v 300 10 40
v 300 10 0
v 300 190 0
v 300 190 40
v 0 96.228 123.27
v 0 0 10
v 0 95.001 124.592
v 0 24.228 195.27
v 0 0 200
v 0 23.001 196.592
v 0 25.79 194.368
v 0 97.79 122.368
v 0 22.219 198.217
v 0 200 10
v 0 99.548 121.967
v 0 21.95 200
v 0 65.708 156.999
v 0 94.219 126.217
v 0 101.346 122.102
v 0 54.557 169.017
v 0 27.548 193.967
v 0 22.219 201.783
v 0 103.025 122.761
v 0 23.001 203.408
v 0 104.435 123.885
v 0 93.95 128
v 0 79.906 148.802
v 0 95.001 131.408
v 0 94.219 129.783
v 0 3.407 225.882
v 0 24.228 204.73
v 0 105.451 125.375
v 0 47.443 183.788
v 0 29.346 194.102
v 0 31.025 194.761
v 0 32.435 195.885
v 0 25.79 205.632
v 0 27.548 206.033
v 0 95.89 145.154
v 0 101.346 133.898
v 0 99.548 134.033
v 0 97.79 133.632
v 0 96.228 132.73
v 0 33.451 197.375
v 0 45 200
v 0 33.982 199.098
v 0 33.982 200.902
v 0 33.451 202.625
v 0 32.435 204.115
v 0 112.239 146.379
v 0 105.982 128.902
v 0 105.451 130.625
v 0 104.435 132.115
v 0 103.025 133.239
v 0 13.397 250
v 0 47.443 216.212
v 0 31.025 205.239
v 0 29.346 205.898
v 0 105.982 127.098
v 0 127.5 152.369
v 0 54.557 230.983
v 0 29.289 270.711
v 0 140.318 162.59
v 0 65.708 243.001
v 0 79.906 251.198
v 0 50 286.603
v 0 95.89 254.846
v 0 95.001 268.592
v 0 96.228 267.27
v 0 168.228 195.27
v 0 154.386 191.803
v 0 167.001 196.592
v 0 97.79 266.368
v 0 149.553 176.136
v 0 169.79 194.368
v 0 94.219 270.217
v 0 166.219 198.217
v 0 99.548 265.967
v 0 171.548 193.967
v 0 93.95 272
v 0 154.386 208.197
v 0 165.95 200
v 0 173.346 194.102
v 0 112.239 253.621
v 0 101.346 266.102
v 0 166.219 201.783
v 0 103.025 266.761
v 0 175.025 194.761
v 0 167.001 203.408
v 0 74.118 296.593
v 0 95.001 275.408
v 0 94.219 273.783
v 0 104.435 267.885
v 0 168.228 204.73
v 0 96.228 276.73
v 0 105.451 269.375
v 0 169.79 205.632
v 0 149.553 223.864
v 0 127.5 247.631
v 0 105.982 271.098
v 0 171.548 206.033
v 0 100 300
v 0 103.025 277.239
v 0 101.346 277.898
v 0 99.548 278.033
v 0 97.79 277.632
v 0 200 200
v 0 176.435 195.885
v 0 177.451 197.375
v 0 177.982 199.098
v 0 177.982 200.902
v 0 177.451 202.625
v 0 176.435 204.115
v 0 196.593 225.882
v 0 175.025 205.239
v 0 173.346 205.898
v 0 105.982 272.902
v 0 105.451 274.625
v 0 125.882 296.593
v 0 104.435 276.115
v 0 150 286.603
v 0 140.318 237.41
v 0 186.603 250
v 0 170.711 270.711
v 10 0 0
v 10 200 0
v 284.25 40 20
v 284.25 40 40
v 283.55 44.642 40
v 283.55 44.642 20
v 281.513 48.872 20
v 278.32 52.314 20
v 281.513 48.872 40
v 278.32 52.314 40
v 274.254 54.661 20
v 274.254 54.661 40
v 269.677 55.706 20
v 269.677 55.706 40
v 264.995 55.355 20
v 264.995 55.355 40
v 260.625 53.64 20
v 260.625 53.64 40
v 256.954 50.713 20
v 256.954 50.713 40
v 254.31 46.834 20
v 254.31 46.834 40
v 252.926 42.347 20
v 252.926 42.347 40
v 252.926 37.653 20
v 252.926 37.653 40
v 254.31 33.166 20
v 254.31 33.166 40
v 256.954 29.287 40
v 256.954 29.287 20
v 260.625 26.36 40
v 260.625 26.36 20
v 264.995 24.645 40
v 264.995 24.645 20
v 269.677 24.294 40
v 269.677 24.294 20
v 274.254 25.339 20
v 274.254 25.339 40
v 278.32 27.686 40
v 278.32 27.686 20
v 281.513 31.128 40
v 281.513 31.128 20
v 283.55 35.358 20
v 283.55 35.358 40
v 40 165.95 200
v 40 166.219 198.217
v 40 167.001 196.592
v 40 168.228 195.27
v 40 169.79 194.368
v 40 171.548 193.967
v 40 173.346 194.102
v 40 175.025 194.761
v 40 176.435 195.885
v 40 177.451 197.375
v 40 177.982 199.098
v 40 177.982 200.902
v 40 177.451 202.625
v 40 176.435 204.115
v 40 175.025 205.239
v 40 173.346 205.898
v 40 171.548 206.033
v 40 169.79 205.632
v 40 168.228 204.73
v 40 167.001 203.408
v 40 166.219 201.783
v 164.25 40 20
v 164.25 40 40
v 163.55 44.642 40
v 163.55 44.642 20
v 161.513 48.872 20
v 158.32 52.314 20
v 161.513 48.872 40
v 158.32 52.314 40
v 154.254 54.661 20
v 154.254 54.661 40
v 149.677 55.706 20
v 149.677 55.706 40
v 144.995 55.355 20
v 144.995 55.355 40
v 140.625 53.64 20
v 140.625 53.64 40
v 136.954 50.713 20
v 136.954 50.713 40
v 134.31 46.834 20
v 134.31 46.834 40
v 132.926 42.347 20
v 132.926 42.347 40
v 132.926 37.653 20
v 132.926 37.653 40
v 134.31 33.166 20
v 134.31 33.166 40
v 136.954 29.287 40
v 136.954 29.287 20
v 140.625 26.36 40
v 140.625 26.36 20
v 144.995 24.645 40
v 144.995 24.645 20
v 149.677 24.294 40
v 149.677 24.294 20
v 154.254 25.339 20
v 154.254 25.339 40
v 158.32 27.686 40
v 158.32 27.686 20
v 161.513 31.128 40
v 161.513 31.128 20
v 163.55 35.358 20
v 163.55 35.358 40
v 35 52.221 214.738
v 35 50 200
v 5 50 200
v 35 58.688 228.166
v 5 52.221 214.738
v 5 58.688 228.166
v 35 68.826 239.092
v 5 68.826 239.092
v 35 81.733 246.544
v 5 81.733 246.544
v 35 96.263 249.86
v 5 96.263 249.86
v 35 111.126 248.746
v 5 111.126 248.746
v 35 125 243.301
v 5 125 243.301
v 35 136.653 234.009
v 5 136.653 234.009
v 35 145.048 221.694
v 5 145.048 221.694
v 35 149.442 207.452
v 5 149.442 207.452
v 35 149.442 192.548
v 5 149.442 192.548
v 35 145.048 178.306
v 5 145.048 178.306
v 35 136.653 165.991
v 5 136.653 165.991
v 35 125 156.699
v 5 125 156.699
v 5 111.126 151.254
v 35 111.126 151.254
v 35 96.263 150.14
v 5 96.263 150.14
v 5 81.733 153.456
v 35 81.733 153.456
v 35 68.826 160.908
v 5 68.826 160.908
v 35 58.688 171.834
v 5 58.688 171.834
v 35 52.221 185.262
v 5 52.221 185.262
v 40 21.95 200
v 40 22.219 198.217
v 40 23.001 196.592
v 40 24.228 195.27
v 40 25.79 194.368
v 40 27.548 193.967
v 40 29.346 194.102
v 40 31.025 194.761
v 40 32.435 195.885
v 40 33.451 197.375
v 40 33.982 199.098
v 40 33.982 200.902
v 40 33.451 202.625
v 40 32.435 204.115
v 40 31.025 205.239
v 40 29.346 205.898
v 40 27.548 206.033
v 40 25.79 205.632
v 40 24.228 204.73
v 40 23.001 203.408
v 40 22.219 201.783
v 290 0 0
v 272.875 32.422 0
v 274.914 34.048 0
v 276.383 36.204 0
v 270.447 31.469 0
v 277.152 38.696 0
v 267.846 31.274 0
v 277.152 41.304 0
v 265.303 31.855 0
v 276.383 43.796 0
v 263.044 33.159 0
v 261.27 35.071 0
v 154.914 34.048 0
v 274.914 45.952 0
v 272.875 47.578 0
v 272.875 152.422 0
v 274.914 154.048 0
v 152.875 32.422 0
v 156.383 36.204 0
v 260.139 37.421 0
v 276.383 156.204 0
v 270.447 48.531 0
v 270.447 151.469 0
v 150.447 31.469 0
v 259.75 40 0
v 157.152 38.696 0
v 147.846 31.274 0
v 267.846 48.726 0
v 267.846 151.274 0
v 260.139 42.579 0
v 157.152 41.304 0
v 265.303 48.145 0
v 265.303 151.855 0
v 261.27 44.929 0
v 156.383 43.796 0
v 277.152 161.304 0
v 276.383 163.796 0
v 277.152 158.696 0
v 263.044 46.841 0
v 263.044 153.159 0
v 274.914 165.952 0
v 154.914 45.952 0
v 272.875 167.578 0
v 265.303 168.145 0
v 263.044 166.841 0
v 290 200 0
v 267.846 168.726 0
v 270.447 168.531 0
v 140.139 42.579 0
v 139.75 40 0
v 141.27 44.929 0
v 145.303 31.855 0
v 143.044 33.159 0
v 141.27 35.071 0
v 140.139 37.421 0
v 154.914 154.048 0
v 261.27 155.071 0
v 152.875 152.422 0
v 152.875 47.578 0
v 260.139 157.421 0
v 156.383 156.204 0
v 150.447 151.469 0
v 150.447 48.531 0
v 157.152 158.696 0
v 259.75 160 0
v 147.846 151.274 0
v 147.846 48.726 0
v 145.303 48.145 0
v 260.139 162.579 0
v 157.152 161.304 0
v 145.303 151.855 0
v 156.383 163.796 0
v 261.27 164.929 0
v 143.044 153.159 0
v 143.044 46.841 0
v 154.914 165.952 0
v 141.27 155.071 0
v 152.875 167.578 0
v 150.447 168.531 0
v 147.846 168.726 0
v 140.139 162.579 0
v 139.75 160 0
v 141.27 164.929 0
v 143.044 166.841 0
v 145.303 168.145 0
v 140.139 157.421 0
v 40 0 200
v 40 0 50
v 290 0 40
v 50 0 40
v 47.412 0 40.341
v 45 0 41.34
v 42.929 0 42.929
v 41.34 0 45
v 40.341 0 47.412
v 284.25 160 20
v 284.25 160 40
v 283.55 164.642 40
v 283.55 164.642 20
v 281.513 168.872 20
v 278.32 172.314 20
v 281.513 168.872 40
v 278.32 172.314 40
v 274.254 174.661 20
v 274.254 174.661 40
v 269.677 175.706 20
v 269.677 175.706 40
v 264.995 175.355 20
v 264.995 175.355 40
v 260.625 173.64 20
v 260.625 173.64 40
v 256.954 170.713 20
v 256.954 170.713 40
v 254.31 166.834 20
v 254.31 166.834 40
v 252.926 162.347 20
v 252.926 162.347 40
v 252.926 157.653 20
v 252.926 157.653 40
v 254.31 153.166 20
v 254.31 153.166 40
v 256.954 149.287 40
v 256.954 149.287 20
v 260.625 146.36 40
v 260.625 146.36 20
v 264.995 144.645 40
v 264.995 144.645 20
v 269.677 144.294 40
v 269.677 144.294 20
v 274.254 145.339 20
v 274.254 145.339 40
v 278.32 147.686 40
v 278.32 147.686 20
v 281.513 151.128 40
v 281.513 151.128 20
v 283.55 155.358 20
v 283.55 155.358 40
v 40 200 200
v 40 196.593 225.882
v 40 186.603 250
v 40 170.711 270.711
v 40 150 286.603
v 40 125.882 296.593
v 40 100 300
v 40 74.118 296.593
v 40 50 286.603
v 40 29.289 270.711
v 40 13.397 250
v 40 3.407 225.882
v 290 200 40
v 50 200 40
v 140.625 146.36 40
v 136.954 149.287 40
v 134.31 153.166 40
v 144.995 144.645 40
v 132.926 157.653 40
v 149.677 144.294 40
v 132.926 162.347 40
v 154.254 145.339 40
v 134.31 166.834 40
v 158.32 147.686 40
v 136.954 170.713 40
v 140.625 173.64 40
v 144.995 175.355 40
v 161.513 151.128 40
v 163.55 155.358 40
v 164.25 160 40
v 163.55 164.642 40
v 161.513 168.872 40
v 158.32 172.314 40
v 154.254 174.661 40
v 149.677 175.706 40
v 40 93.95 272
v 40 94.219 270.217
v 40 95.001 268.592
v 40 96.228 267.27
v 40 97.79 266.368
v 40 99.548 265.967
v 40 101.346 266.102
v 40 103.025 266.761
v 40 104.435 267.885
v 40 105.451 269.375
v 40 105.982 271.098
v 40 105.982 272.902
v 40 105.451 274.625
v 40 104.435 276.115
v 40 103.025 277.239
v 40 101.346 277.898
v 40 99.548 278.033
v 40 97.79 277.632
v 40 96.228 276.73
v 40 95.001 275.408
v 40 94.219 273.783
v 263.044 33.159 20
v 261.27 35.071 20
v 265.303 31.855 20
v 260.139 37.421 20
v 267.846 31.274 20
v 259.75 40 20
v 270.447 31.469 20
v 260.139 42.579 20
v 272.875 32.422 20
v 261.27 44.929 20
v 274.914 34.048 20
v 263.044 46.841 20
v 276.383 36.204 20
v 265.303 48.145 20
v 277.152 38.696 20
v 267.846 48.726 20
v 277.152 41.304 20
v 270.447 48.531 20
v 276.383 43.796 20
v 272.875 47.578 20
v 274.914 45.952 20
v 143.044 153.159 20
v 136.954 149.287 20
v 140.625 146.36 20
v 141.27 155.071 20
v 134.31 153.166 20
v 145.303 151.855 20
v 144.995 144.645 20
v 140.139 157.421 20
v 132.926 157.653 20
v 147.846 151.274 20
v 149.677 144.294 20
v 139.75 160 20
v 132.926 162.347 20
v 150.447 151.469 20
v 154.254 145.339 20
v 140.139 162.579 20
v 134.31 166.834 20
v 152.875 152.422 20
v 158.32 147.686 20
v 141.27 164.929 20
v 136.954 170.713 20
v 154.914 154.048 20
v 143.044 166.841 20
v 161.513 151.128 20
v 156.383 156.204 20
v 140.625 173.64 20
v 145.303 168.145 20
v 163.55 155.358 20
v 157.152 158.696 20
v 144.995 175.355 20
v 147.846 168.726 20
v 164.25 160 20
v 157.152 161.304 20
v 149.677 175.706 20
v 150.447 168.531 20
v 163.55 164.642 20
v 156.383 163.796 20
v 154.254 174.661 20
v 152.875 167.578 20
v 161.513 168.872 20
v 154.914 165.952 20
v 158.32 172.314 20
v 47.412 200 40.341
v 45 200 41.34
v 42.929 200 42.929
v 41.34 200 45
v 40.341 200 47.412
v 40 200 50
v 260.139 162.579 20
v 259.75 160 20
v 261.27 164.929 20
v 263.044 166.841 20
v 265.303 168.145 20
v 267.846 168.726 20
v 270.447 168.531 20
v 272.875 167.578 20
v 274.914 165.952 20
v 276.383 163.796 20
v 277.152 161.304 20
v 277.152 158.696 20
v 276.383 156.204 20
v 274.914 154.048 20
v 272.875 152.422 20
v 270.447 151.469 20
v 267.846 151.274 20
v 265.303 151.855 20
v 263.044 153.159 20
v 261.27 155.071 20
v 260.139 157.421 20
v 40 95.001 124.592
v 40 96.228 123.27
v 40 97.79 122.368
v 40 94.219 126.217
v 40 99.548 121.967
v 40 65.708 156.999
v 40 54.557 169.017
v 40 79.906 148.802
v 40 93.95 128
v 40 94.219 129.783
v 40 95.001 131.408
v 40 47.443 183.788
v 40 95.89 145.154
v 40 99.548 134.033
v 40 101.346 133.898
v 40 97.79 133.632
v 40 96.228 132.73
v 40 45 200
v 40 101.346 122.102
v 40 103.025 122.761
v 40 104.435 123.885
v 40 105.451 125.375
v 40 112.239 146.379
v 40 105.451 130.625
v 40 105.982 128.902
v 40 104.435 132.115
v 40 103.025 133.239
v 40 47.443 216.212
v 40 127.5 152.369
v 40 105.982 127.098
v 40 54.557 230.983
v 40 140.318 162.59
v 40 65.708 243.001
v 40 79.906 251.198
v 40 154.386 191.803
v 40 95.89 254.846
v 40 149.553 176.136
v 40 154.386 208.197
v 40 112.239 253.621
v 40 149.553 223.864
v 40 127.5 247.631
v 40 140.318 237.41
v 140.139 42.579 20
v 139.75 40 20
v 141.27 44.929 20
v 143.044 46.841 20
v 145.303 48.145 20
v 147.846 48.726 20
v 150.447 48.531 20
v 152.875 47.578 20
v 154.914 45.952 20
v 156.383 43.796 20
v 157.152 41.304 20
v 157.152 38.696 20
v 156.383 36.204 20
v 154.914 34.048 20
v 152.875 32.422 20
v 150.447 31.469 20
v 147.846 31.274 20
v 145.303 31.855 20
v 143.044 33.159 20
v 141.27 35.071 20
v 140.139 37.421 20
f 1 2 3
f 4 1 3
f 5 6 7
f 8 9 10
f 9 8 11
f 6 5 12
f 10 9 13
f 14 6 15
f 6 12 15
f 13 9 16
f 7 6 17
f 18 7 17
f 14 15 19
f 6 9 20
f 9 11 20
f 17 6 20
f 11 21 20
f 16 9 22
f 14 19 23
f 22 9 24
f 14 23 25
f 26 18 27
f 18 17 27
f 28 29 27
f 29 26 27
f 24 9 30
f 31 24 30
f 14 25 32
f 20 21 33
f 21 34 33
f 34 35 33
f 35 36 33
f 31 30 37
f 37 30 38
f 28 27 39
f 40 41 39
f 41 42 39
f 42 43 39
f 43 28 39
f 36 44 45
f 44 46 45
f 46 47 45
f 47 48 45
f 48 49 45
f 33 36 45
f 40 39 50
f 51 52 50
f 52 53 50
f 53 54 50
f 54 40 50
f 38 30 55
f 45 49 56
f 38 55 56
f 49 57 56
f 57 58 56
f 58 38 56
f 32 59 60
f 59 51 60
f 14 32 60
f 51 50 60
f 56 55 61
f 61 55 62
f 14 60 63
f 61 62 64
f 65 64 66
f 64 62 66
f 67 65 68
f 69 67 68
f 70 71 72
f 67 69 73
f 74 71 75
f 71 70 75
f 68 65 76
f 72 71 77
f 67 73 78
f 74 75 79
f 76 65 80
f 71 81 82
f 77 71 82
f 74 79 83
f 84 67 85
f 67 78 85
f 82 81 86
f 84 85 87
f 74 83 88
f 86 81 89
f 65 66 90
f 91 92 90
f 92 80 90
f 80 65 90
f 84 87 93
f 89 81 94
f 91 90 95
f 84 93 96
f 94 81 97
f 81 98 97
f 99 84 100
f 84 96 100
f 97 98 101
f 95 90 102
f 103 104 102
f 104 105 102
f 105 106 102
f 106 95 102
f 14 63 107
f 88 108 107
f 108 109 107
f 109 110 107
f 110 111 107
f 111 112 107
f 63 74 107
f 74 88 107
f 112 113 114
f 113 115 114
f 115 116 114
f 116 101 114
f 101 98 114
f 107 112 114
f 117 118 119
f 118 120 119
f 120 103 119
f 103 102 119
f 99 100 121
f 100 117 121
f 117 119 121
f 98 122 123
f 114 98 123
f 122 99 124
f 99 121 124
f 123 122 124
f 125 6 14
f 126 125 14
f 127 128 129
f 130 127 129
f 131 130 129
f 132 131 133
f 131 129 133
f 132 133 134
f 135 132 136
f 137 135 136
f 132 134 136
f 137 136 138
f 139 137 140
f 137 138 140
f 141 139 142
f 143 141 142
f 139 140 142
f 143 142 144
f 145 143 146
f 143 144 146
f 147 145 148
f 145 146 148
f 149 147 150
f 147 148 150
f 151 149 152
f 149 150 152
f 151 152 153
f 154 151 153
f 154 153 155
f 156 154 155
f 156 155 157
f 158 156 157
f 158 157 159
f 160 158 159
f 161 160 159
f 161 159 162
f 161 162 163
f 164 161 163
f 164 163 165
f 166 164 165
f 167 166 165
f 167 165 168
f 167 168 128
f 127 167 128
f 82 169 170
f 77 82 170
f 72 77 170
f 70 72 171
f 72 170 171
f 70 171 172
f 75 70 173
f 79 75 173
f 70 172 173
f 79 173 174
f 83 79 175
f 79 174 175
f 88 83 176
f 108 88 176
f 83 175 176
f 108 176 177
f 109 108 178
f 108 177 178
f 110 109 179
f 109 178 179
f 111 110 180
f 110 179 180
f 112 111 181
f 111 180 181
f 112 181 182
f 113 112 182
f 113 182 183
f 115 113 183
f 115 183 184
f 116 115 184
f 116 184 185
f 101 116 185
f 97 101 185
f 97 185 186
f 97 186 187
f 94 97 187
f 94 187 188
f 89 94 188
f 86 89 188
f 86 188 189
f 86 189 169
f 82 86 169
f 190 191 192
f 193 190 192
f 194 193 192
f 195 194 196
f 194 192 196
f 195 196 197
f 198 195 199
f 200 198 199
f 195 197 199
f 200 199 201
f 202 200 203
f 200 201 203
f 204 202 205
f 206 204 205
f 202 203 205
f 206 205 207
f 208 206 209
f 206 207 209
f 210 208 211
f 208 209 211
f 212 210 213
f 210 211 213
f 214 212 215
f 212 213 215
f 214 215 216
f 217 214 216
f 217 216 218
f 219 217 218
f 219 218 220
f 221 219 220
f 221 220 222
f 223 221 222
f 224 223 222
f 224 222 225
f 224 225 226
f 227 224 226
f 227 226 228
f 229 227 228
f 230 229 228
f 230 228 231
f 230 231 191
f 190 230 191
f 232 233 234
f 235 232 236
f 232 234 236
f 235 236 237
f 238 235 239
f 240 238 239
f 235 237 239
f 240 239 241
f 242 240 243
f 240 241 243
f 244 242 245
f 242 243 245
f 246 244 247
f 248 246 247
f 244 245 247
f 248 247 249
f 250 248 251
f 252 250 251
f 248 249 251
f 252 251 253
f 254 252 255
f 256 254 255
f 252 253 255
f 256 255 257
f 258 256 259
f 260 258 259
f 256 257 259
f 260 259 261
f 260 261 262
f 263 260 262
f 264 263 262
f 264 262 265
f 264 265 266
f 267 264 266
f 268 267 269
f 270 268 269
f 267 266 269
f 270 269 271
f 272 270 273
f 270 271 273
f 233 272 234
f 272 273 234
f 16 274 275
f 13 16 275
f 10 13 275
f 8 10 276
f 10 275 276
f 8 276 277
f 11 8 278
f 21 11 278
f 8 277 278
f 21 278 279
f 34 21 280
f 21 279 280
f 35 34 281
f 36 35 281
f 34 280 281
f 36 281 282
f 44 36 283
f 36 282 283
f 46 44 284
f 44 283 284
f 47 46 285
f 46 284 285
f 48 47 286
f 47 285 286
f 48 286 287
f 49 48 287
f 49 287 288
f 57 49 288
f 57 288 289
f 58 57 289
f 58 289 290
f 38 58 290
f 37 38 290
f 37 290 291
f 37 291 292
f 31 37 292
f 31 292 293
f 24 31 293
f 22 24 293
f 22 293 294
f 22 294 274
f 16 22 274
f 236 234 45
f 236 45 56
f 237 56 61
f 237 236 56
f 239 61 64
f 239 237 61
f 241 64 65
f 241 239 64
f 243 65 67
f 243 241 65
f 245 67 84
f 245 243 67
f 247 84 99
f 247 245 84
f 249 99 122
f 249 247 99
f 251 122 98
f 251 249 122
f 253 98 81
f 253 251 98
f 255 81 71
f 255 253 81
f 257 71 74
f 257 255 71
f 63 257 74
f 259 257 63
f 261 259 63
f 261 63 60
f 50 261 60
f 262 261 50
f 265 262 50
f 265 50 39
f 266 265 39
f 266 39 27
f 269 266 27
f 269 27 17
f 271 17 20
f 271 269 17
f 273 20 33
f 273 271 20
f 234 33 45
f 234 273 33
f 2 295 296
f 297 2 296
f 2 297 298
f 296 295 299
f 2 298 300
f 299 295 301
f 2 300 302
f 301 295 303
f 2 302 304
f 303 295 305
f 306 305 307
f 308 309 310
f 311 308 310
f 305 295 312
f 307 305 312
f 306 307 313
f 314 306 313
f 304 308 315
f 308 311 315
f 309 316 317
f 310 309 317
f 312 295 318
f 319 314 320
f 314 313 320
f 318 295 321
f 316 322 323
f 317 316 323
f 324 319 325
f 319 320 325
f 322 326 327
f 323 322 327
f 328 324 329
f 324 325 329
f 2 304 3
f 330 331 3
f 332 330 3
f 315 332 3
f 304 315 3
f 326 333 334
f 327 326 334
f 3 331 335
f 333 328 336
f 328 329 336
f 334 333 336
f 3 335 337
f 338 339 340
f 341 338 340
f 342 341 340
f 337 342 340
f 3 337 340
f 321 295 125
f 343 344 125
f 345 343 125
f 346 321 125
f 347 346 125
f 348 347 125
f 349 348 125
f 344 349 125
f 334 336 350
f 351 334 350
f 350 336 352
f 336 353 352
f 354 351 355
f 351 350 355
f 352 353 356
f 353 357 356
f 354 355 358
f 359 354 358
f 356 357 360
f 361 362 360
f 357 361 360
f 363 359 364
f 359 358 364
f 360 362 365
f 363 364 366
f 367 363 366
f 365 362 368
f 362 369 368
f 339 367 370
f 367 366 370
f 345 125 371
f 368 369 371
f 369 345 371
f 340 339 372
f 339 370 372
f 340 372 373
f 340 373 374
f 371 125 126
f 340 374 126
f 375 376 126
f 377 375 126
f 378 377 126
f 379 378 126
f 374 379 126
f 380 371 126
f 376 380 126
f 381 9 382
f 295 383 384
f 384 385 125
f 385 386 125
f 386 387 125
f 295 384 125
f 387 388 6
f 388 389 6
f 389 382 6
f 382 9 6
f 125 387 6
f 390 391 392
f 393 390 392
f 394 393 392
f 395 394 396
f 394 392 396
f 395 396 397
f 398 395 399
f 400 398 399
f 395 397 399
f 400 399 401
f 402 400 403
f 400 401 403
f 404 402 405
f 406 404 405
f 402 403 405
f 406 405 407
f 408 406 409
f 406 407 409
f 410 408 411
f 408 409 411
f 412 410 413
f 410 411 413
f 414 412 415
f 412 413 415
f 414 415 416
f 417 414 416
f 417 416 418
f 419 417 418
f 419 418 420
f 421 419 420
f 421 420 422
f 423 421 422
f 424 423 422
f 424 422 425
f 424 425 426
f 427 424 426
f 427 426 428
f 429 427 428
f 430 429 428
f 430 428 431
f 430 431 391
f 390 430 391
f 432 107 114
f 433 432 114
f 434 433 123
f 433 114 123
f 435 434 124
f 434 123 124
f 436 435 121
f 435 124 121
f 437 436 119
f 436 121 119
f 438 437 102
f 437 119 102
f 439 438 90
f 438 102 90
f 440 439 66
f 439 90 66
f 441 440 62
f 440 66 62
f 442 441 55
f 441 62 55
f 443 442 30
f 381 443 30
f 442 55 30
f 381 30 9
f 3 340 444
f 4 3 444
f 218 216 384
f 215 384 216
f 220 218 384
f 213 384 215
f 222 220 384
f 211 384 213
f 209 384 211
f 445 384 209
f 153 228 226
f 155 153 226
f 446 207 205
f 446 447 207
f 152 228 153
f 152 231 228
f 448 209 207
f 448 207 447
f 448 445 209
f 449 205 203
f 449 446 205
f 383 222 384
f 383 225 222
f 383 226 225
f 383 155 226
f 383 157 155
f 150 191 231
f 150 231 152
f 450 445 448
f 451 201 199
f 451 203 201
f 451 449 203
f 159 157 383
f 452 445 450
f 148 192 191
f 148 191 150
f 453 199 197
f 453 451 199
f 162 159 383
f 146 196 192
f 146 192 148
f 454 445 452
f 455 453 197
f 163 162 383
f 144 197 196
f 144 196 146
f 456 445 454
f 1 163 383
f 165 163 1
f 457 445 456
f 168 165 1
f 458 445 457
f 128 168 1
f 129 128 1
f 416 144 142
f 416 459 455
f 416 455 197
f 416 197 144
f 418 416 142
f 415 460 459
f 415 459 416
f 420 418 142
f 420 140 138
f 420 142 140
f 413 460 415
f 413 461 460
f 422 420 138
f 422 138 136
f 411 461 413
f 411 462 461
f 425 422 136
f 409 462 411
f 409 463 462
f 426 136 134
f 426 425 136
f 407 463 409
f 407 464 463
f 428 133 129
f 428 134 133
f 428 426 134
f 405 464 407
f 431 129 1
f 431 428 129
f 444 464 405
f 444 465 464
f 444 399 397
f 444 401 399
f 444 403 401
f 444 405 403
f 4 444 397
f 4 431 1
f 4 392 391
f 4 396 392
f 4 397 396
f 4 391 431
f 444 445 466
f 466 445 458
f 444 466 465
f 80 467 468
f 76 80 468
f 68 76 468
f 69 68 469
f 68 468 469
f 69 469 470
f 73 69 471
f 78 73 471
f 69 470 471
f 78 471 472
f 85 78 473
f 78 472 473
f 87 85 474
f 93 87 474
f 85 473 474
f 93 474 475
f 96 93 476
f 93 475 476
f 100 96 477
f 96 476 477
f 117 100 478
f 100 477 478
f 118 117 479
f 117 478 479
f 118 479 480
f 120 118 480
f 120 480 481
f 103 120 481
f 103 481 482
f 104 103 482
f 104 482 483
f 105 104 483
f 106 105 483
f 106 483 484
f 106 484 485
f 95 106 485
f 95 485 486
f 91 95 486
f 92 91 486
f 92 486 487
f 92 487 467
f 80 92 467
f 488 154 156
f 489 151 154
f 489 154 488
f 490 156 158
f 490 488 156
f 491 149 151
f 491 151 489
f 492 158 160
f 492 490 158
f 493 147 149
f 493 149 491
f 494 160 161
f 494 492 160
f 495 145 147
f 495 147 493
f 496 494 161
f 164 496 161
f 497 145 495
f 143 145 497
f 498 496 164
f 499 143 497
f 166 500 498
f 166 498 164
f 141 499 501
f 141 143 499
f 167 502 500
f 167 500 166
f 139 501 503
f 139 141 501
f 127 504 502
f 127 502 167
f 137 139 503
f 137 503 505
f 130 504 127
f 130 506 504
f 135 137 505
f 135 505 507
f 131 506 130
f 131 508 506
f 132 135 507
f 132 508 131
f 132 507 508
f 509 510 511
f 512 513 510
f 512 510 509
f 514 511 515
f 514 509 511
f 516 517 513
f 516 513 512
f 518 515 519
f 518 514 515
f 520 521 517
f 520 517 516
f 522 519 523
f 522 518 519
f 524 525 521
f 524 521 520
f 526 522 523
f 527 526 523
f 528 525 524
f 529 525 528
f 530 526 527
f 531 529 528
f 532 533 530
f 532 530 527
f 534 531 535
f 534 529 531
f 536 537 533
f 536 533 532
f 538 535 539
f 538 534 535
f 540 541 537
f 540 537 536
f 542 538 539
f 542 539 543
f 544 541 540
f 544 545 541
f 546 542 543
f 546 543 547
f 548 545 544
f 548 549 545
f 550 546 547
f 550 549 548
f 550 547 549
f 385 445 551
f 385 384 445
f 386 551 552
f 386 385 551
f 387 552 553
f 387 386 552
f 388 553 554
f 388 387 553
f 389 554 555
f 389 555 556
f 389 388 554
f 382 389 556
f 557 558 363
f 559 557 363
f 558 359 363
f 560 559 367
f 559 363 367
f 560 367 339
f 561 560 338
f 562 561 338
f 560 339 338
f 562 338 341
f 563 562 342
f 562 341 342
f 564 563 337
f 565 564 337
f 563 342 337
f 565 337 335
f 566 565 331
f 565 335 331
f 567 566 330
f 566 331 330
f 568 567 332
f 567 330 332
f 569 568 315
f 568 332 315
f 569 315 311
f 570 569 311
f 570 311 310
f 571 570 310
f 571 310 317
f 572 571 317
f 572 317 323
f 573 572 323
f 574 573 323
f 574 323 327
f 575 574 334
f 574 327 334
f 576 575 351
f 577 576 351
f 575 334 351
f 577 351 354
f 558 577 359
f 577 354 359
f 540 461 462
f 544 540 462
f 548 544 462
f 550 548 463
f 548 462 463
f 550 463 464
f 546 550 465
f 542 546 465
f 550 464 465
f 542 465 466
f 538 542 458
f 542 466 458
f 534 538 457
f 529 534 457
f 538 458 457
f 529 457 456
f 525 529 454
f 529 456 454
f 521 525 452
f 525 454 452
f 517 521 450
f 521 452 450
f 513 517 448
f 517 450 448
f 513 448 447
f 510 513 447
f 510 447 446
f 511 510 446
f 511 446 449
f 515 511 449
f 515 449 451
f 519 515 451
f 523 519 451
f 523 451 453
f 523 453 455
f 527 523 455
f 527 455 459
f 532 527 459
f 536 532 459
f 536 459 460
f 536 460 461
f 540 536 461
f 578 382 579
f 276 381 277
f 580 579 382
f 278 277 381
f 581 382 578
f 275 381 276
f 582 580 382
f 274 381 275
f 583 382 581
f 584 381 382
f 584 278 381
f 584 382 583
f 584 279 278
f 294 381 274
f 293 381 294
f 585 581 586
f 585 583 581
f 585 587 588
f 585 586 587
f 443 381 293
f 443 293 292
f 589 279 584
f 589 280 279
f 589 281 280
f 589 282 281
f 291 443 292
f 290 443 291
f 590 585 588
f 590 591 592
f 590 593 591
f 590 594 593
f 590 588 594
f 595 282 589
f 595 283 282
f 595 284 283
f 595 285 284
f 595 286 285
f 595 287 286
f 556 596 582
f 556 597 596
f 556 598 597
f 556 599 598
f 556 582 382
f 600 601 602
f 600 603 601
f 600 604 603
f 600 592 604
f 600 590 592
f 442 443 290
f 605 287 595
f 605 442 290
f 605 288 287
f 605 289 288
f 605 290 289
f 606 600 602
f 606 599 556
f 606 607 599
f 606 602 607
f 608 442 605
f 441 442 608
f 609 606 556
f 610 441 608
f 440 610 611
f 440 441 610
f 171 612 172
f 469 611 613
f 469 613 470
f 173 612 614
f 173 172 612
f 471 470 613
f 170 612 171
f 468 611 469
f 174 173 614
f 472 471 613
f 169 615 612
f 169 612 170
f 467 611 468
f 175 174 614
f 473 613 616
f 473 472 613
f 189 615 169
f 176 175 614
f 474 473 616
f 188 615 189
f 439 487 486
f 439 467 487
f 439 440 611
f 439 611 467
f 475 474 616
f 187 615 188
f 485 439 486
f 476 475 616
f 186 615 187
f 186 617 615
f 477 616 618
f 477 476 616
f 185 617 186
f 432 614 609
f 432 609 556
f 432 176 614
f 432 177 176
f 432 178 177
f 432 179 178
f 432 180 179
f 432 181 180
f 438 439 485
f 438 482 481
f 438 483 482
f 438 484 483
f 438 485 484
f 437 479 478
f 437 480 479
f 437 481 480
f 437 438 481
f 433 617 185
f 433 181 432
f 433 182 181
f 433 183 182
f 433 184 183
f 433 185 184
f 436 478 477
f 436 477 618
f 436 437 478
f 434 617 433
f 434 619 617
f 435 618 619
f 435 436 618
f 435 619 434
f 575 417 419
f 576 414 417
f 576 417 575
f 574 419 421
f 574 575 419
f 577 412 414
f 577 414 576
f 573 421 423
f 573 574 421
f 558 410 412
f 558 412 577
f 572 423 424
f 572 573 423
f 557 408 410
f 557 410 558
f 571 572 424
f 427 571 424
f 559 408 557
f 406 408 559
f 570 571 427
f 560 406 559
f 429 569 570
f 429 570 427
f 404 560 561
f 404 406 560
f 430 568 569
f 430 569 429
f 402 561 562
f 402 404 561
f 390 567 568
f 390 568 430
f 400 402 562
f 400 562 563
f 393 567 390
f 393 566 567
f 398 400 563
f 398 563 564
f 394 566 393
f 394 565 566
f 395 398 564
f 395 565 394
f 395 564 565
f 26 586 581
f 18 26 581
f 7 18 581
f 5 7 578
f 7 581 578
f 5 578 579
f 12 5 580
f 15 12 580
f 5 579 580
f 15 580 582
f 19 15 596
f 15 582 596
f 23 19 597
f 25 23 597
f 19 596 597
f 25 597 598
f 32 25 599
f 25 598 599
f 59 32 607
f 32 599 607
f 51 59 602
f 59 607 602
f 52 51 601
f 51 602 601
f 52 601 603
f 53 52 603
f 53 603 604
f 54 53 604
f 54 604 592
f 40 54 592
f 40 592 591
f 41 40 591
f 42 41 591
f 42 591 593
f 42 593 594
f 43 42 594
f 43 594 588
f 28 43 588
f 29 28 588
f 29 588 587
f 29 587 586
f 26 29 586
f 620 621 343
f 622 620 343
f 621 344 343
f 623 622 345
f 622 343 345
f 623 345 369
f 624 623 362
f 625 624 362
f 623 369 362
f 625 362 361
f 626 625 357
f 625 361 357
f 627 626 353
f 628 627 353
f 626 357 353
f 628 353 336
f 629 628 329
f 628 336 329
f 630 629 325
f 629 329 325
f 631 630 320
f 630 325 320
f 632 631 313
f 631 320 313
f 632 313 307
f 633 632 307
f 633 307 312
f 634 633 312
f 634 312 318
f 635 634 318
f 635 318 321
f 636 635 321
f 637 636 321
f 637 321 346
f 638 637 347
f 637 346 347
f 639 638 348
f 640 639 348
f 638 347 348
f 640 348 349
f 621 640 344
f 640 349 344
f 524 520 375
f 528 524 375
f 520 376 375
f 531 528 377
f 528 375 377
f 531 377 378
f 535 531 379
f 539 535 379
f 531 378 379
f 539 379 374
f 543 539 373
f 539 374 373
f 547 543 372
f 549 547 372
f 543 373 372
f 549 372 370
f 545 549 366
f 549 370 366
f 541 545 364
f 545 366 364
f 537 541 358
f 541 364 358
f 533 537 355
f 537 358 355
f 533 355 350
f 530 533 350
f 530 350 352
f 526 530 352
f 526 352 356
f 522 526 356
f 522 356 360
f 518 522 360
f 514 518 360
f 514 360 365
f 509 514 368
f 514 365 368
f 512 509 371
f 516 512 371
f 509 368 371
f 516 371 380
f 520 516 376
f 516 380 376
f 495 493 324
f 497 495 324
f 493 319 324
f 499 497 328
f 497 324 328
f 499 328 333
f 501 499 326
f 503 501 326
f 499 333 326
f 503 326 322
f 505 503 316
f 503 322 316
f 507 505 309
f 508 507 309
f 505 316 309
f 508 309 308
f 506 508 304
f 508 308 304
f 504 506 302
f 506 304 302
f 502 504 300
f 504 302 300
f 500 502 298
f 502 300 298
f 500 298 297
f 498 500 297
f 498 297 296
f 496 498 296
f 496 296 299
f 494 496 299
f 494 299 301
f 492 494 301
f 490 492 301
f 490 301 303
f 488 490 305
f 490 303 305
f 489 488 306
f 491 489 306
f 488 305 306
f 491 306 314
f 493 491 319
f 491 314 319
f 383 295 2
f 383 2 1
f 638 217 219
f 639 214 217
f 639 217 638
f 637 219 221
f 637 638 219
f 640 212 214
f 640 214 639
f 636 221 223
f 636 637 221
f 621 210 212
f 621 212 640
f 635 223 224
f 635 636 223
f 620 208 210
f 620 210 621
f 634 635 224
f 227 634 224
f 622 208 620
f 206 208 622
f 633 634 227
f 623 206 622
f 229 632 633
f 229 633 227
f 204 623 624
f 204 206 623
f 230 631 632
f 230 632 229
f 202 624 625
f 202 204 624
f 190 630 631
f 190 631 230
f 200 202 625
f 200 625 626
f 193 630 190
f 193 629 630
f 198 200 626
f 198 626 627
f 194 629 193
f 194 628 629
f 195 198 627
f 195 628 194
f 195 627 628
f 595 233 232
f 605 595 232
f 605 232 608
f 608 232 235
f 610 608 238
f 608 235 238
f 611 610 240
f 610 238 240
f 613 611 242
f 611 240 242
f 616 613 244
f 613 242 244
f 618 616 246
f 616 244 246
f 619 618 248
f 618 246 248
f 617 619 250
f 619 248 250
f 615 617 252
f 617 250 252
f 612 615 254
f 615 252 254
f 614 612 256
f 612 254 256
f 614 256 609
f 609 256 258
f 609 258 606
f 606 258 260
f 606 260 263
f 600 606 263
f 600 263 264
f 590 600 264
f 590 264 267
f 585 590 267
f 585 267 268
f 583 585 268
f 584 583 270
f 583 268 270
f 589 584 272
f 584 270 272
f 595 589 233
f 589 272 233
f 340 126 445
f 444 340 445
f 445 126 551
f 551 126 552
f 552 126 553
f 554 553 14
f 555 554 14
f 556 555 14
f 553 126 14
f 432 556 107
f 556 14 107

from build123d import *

# Parameters (mm, degrees)
F1_W            = 10
F1_H            = 40
F1_W_2          = 180
F2_DEPTH        = 40
F3_D            = 12.1
F4_W            = 300
F4_H            = 200
F5_DEPTH        = 40
F6_SIZE         = 10
F7_SIZE         = 10
F8_SIZE         = 10
F9_R            = 10
F10_SIZE        = 5
F12_D           = 17.5
F12_CBORE_D     = 31.5
F12_CBORE_DEPTH = 20


with BuildPart() as f2:
    # F1 (on Right) → F2 (new body)
    with BuildSketch(Plane.YZ):
        with Locations((5, 20)):
            Rectangle(F1_W, F1_H)
        with Locations((100, 20)):
            Rectangle(F1_W_2, F1_H)
        with BuildLine():
            Line((0, 200), (0, 40))
            Line((0, 40), (10, 40))
            Line((10, 40), (190, 40))
            Line((190, 40), (200, 40))
            Line((200, 40), (200, 200))
            ThreePointArc((200, 200), (100, 100), (0, 200))
        make_face()
        with Locations((195, 20)):
            Rectangle(F1_W, F1_H)
        with BuildLine():
            ThreePointArc((200, 200), (100, 300), (0, 200))
            Line((0, 200), (50, 200))
            ThreePointArc((50, 200), (100, 250), (150, 200))
            Line((150, 200), (200, 200))
        make_face()
        with BuildLine():
            Line((50, 200), (0, 200))
            ThreePointArc((0, 200), (100, 100), (200, 200))
            Line((200, 200), (150, 200))
            ThreePointArc((150, 200), (100, 150), (50, 200))
        make_face()
    extrude(amount=F2_DEPTH)

    # F3 (through all)
    with Locations(Plane(origin=(0, 0, 0), x_dir=(0, 1, 0), z_dir=(-1, 0, 0))):
        with Locations((100, -272), (100, -128), (172, -200), (28, -200)):
            Hole(F3_D / 2)

    # F4 (on Top) → F5 (join)
    with BuildSketch(Plane.XY):
        with Locations((150, 100)):
            Rectangle(F4_W, F4_H)
    extrude(amount=F5_DEPTH)

    # F6
    f6_edges = [f2.edges().sort_by_distance(p)[0] for p in [
        (300, 0, 20),
    ]]
    chamfer(f6_edges, length=F6_SIZE)

    # F7
    f7_edges = [f2.edges().sort_by_distance(p)[0] for p in [
        (300, 200, 20),
    ]]
    chamfer(f7_edges, length=F7_SIZE)

    # F8
    f8_edges = [f2.edges().sort_by_distance(p)[0] for p in [
        (0, 100, 0),
    ]]
    chamfer(f8_edges, length=F8_SIZE)

    # F9
    f9_edges = [f2.edges().sort_by_distance(p)[0] for p in [
        (40, 100, 40),
    ]]
    fillet(f9_edges, radius=F9_R)

    # F10
    f10_edges = [f2.edges().sort_by_distance(p)[0] for p in [
        (40, 150, 200),
        (0, 150, 200),
    ]]
    chamfer(f10_edges, length=F10_SIZE)

    # F12 (through all)
    with Locations(Plane.XY.offset(40)):
        with Locations((268.5, 40), (148.5, 40), (148.5, 160), (268.5, 160)):
            CounterBoreHole(F12_D / 2, F12_CBORE_D / 2, F12_CBORE_DEPTH)


solid = f2.part
